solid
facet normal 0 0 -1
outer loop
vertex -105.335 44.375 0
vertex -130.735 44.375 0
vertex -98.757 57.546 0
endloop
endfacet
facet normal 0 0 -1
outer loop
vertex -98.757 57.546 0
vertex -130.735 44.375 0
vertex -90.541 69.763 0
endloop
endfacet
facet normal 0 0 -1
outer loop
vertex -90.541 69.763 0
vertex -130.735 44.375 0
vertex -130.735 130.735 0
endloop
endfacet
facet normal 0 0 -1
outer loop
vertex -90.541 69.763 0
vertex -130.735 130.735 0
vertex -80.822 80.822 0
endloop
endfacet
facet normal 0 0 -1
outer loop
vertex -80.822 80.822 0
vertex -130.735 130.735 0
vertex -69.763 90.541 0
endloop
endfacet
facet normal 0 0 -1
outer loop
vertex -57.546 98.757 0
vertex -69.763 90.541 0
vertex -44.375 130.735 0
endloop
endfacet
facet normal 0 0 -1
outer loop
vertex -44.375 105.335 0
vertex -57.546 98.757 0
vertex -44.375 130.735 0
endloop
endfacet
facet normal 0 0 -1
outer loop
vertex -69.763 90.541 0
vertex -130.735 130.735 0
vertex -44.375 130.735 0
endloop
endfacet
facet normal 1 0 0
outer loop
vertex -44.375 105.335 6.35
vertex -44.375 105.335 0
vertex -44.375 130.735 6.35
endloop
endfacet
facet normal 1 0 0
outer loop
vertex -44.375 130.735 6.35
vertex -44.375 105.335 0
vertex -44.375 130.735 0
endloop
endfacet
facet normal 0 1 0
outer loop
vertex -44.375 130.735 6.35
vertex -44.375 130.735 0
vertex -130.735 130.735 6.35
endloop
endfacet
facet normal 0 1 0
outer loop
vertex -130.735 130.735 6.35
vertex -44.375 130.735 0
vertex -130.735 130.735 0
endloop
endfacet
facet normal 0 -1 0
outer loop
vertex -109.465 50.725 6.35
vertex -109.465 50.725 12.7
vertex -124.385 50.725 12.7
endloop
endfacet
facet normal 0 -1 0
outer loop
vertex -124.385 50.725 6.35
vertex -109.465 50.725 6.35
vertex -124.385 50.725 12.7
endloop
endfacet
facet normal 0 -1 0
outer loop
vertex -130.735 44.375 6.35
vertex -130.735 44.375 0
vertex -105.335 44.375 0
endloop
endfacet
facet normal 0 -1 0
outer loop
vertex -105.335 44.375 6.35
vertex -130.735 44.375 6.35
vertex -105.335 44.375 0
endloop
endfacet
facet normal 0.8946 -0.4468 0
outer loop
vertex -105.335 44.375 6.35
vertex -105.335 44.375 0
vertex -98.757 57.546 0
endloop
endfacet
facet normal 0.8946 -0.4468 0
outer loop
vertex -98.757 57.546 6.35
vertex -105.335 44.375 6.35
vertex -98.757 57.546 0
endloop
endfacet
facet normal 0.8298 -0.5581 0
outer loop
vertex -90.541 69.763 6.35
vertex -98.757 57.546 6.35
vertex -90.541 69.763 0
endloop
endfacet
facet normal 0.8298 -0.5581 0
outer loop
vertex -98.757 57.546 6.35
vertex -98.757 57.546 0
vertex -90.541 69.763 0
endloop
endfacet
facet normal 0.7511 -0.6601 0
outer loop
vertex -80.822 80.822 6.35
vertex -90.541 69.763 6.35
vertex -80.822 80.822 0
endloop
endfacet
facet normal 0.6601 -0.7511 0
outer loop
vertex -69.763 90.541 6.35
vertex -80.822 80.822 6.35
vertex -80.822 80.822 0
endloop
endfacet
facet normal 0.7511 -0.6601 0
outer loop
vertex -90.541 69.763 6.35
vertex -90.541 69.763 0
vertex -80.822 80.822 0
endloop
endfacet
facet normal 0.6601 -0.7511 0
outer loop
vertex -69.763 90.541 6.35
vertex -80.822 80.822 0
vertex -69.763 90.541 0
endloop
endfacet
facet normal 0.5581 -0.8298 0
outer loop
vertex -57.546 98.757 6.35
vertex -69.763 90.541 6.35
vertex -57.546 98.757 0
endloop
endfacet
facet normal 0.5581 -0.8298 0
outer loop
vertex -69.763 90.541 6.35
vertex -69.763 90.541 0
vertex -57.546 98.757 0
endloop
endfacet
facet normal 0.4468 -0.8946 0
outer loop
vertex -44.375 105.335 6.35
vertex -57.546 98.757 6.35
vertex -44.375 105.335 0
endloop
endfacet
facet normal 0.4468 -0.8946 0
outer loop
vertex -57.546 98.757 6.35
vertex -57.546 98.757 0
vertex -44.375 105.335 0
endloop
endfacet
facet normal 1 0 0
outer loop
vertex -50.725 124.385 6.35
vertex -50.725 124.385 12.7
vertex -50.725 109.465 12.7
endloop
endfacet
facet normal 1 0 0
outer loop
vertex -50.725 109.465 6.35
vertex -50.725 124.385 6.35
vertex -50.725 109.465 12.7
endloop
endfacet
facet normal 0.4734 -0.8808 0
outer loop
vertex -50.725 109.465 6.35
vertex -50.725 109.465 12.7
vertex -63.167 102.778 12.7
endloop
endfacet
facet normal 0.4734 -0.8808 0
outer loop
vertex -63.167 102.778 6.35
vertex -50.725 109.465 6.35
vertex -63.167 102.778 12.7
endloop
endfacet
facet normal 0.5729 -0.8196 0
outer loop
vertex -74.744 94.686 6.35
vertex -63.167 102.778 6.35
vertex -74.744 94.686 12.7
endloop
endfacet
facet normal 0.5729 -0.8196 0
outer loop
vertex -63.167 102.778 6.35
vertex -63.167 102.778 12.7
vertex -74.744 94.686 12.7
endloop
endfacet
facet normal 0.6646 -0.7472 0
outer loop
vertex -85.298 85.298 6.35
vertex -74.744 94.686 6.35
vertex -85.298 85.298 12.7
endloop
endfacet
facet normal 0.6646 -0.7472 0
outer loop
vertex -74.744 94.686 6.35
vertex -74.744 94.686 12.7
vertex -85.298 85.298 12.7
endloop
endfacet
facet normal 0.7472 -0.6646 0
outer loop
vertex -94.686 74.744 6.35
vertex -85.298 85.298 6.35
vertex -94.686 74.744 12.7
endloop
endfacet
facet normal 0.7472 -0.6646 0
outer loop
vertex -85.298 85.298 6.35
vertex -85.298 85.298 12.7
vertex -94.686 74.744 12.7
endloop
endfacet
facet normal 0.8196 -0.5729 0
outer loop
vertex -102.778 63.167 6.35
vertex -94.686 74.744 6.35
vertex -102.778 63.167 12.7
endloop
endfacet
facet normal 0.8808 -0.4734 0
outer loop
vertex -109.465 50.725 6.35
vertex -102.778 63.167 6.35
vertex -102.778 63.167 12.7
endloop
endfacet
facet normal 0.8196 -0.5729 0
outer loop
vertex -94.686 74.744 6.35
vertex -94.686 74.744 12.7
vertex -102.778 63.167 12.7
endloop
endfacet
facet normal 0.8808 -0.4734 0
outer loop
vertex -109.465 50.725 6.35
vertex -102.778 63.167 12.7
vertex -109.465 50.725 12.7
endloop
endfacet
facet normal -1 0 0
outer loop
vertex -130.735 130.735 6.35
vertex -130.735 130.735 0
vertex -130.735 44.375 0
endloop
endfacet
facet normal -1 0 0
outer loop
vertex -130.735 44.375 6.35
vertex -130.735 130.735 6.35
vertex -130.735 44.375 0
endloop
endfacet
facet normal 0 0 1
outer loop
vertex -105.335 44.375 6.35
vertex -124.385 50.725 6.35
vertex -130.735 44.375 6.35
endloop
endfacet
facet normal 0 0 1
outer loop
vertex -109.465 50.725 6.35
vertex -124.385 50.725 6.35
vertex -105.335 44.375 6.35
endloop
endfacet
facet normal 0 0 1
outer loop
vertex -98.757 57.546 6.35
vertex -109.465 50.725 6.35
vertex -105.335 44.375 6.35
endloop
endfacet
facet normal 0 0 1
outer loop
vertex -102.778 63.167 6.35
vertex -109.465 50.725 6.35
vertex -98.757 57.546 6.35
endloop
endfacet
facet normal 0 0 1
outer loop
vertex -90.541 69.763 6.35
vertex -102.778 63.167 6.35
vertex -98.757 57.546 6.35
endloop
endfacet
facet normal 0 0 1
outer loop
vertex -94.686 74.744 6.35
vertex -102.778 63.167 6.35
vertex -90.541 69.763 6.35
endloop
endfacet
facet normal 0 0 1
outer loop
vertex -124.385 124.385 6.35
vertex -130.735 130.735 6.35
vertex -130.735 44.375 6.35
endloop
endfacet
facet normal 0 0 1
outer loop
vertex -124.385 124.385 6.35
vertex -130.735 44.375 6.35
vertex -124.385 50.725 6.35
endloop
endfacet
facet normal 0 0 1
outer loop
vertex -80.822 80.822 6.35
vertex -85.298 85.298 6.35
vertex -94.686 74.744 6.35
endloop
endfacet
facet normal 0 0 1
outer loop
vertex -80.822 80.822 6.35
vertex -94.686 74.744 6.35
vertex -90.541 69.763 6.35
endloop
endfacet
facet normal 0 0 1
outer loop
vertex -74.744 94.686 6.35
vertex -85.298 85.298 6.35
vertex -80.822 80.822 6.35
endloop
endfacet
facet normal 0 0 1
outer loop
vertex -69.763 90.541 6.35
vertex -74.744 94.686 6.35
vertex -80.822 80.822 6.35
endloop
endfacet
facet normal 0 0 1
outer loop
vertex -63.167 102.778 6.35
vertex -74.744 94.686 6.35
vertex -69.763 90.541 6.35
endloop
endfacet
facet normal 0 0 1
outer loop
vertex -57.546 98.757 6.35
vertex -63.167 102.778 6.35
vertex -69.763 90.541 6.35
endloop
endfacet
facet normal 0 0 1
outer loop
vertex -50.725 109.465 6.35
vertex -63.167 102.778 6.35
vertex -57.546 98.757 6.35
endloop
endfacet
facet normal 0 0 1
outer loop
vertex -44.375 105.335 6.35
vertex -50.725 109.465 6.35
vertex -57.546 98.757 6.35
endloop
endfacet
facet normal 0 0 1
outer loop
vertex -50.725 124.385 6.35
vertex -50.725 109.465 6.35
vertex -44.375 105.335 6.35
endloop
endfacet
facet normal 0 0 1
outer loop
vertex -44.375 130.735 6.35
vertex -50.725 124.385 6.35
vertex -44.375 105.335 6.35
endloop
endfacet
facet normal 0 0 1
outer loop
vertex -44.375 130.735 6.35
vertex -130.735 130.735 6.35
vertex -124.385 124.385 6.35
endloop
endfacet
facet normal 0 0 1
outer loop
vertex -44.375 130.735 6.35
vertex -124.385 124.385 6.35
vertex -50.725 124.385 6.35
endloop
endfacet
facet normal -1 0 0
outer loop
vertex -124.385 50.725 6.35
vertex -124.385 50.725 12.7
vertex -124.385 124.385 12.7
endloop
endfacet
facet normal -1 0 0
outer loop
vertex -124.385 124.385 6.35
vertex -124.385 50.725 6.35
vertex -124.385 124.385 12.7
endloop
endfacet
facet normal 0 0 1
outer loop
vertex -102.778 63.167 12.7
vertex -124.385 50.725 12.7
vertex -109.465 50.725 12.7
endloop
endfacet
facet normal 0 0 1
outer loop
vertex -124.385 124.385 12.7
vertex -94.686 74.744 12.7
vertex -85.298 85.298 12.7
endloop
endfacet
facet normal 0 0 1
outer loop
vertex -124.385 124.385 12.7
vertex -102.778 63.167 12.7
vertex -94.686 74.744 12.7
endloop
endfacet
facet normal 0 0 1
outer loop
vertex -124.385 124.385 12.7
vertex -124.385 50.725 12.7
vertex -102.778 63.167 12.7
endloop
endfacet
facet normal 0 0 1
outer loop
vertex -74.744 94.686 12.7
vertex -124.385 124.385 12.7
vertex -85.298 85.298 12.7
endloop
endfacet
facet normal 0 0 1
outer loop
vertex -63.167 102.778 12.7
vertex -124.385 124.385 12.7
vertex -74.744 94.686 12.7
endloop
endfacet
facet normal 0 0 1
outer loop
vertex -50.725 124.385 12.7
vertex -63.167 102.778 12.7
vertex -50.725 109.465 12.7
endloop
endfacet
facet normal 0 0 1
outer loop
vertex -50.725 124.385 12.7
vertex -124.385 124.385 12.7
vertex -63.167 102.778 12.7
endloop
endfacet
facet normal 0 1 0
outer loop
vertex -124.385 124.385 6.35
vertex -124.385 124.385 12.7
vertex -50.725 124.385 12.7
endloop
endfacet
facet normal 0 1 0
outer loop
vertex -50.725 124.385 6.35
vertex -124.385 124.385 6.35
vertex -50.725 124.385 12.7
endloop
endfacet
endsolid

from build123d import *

# Parameters (mm, degrees)
F1_DEPTH = 12.7
F3_DEPTH = 6.35


with BuildPart() as f1:
    # F0 (on Top) → F1 (new body)
    with BuildSketch(Plane.XY):
        with BuildLine():
            Line((-44.3746231037, 130.7346231037), (-130.7346231037, 130.7346231037))
            Line((-130.7346231037, 130.7346231037), (-130.7346231037, 44.3746231037))
            Line((-130.7346231037, 44.3746231037), (-105.3346231037, 44.3746231037))
            ThreePointArc((-105.3346231037, 44.3746231037), (-80.8223050896, 80.8223050896), (-44.3746231037, 105.3346231037))
            Line((-44.3746231037, 105.3346231037), (-44.3746231037, 130.7346231037))
        make_face()
    extrude(amount=F1_DEPTH)

    # F2 (on face) → F3 (cut)
    with BuildSketch(Plane.XY.offset(12.7)):
        with BuildLine():
            Line((-44.3746231037, 130.7346231037), (-130.7346231037, 130.7346231037))
            Line((-130.7346231037, 130.7346231037), (-130.7346231037, 44.3746231037))
            Line((-130.7346231037, 44.3746231037), (-105.3346231037, 44.3746231037))
            ThreePointArc((-105.3346231037, 44.3746231037), (-80.8223050896, 80.8223050896), (-44.3746231037, 105.3346231037))
            Line((-44.3746231037, 105.3346231037), (-44.3746231037, 130.7346231037))
        make_face()
        with BuildLine():
            Line((-124.3846231037, 124.3846231037), (-50.7246231037, 124.3846231037))
            Line((-50.7246231037, 124.3846231037), (-50.7246231037, 109.4650677811))
            ThreePointArc((-50.7246231037, 109.4650677811), (-85.2982218646, 85.2982218646), (-109.4650677811, 50.7246231037))
            Line((-109.4650677811, 50.7246231037), (-124.3846231037, 50.7246231037))
            Line((-124.3846231037, 50.7246231037), (-124.3846231037, 124.3846231037))
        make_face(mode=Mode.SUBTRACT)
    extrude(amount=-F3_DEPTH, mode=Mode.SUBTRACT)


solid = f1.part
